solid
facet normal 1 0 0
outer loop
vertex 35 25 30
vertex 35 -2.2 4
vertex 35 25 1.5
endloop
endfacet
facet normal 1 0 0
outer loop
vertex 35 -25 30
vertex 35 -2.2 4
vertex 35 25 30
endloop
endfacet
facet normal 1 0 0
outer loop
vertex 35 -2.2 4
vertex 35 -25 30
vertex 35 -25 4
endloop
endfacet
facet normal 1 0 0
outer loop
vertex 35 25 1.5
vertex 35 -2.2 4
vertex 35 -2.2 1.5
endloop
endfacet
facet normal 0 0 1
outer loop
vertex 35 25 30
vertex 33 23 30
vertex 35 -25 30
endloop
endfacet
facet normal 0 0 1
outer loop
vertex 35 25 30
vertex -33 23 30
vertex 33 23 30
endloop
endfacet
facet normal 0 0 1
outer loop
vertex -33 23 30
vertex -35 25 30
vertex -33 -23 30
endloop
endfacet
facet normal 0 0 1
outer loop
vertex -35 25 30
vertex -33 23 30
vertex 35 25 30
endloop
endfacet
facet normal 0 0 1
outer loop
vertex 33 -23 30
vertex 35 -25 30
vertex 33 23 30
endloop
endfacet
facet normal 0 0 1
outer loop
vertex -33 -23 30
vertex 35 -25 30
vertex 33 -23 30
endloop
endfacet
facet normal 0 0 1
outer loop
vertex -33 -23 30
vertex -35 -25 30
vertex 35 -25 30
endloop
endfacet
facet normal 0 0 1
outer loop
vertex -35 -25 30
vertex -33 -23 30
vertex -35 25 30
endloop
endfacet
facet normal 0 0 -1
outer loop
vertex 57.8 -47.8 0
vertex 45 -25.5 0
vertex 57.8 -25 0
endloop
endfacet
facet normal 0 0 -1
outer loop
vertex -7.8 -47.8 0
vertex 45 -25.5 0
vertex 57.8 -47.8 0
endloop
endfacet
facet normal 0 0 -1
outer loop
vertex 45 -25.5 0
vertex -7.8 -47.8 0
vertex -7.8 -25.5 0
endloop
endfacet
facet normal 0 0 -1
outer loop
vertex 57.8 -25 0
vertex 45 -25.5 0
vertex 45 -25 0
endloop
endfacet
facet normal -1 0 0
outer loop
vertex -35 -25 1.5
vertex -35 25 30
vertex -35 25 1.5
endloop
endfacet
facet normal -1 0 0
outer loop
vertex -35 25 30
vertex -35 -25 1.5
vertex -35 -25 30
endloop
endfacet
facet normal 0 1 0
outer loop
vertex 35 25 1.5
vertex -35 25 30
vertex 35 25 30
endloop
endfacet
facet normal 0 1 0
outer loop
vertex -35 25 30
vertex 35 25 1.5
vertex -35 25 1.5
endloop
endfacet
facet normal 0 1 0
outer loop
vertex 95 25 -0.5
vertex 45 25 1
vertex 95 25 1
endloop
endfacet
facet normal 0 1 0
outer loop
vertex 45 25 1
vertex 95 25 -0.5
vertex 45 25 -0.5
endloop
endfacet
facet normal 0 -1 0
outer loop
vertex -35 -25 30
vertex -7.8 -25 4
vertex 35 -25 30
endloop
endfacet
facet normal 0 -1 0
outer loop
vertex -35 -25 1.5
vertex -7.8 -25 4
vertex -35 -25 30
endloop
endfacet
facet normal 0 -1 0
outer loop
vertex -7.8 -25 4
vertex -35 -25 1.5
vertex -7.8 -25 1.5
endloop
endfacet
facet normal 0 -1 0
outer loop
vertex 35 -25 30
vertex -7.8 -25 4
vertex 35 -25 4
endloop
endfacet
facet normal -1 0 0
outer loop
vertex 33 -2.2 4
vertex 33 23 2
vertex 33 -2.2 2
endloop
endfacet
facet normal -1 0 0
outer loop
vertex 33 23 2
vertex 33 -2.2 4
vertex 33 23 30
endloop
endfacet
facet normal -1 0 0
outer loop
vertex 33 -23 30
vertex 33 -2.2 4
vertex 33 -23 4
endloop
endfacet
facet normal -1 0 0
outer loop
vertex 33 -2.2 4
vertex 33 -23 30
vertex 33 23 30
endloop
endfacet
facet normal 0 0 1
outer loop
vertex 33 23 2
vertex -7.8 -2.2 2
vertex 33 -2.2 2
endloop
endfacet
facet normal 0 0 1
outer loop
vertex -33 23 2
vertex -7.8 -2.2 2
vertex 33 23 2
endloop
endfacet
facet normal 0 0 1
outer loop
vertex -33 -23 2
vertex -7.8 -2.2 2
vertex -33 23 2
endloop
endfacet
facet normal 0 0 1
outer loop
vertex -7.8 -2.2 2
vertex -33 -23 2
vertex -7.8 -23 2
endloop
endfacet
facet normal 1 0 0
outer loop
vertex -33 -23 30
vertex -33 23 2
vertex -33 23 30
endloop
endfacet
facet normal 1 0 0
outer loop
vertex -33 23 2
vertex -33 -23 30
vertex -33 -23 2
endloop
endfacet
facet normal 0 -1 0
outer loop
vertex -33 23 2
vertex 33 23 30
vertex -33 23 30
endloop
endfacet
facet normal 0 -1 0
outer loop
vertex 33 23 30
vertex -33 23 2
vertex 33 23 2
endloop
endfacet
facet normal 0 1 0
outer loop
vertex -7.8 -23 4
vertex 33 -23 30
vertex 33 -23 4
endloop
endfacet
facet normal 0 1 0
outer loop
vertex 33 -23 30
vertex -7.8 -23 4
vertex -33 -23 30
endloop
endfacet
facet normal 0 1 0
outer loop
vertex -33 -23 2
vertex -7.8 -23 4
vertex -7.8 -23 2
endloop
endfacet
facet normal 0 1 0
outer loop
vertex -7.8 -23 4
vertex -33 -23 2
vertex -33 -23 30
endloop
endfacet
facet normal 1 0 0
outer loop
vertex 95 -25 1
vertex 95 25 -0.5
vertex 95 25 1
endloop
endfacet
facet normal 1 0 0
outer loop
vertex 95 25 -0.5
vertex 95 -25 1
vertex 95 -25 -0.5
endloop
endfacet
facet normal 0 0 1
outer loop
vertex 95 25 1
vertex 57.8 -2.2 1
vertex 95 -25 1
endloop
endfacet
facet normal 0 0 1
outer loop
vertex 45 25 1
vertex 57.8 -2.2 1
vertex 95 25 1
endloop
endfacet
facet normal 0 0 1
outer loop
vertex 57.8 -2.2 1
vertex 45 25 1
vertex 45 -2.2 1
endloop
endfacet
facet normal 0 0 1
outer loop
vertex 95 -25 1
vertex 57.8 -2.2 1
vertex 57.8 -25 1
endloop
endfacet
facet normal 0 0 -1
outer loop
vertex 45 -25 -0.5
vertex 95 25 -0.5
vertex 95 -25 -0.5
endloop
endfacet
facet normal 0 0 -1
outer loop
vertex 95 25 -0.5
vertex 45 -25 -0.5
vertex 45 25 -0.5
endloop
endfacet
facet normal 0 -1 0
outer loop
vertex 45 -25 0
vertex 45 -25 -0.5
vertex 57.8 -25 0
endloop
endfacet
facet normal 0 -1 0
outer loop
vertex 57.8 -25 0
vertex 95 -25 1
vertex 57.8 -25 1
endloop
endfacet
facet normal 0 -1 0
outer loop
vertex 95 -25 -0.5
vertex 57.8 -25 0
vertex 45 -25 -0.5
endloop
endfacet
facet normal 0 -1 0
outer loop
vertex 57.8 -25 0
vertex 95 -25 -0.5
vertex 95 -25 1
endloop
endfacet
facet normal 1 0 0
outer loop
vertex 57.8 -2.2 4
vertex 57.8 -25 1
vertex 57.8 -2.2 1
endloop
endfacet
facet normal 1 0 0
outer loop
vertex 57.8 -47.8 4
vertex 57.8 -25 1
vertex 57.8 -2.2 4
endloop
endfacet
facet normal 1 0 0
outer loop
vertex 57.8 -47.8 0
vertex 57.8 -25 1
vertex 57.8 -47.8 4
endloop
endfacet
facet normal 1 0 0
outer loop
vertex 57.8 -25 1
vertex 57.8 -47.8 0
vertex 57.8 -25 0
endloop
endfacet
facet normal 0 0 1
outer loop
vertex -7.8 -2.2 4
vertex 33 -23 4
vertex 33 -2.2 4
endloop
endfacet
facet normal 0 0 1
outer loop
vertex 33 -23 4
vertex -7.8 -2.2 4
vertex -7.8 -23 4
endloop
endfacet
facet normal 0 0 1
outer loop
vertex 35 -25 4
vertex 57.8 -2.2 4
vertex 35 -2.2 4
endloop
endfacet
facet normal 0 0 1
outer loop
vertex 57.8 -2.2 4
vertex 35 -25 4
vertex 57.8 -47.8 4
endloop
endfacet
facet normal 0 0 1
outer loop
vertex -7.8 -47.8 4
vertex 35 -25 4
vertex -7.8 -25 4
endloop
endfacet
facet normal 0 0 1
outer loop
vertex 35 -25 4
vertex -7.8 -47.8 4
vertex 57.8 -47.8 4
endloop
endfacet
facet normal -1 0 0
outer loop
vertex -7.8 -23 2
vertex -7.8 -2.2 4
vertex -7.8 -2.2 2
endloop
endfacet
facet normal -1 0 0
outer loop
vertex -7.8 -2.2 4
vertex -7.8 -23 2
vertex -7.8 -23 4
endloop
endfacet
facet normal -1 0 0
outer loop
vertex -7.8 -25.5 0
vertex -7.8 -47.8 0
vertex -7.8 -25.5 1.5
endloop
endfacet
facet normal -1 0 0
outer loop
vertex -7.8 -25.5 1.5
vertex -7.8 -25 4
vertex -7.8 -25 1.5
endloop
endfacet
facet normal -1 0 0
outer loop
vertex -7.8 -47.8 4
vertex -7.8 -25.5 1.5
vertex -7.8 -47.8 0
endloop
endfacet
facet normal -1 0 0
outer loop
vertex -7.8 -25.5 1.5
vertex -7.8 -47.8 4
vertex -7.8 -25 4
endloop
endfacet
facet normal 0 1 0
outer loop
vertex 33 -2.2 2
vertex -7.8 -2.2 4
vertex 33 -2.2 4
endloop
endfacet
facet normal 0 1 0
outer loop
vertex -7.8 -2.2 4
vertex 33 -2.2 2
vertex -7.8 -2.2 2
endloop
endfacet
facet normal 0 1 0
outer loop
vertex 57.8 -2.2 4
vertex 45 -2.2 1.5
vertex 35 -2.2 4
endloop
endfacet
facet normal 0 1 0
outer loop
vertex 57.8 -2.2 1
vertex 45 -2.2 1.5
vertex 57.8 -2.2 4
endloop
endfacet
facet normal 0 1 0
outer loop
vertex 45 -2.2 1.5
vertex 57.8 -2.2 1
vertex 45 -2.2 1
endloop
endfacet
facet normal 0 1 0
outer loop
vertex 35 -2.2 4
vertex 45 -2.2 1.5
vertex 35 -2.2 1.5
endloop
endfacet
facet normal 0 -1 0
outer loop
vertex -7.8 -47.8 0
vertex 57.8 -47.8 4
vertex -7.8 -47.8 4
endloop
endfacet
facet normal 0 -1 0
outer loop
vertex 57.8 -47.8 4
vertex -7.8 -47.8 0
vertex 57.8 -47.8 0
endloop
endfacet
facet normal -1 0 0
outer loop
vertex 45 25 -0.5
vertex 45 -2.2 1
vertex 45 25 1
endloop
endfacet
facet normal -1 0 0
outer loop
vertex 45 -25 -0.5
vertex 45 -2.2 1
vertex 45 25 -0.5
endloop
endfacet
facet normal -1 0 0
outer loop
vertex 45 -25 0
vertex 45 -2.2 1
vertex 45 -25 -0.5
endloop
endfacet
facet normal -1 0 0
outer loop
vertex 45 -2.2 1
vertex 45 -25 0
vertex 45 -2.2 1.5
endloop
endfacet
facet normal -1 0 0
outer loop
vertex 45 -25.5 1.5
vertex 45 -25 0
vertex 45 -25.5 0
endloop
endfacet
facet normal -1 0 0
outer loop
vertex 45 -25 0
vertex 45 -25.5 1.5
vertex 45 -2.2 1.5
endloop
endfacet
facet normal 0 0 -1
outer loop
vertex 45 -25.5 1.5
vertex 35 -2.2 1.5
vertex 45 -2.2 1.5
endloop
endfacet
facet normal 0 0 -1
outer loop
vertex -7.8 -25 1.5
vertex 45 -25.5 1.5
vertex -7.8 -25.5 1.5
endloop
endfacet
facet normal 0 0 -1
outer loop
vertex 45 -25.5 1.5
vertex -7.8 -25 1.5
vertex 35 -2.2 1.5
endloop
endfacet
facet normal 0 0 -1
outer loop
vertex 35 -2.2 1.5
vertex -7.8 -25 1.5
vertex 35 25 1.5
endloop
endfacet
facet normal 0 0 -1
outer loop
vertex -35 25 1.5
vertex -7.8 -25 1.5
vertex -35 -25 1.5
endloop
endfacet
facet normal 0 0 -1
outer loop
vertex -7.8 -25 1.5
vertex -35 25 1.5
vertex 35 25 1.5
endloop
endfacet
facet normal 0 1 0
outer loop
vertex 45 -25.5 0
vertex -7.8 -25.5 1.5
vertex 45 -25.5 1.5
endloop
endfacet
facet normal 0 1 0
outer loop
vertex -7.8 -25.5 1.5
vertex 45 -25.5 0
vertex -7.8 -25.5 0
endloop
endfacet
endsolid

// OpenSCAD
// Two-part enclosure for small electronics board
// Print orientation: box standing on bed (z = 0), lid on top, printed upside down

// ---------------- Parameters ----------------
box_x      = 70;    // box outer size in X (mm)
box_y      = 50;    // box outer size in Y (mm)
box_z      = 30;    // box outer size in Z (mm)
box_wall   = 2;     // box wall thickness (mm)
box_floor  = 2;     // box floor thickness (mm)

gap        = 10;    // gap between box and lid (mm)

lip_wall   = 1.5;   // lid lip wall thickness (mm)
lip_h      = 4;     // lid lip height (mm)
lip_x      = 65.6;  // lid lip outer size in X (mm)
lip_y      = 45.6;  // lid lip outer size in Y (mm)

eps        = 0.5;   // cutter overshoot past faces (mm)

$fn = 64;

// ---------------- Modules ----------------
module box() {
    difference() {
        cube([box_x, box_y, box_z]);
        // open-top cavity, extends past top face
        translate([box_wall, box_wall, box_floor])
            cube([box_x - 2*box_wall, box_y - 2*box_wall, box_z - box_floor]);
    }
}

module lid() {
    // plate with a rectangular lip on top, centred
    union() {
        translate([0, 0, -eps])
            cube([box_x, box_y, lip_wall]);   // plate (slightly below z = 0)
        translate([-(lip_x/2), -(lip_y/2), 0])
            cube([lip_x, lip_y, lip_h]);      // lip
    }
}

// ---------------- Layout ----------------
difference() {
    union() {
        // box at origin
        translate([-box_x/2, -box_y/2, 0])
            box();
        // lid on +X side, centred on box
        translate([box_x/2 - gap, -box_y/2, 0])
            lid();
    }
    // keep the gap clean between the two parts
    translate([-box_x/2 - eps, -box_y/2 - eps, -eps])
        cube([(box_x/2 + gap + eps) - (-box_x/2),
              (box_y/2 + eps) - (-box_y/2),
              lip_wall + eps]);
}
